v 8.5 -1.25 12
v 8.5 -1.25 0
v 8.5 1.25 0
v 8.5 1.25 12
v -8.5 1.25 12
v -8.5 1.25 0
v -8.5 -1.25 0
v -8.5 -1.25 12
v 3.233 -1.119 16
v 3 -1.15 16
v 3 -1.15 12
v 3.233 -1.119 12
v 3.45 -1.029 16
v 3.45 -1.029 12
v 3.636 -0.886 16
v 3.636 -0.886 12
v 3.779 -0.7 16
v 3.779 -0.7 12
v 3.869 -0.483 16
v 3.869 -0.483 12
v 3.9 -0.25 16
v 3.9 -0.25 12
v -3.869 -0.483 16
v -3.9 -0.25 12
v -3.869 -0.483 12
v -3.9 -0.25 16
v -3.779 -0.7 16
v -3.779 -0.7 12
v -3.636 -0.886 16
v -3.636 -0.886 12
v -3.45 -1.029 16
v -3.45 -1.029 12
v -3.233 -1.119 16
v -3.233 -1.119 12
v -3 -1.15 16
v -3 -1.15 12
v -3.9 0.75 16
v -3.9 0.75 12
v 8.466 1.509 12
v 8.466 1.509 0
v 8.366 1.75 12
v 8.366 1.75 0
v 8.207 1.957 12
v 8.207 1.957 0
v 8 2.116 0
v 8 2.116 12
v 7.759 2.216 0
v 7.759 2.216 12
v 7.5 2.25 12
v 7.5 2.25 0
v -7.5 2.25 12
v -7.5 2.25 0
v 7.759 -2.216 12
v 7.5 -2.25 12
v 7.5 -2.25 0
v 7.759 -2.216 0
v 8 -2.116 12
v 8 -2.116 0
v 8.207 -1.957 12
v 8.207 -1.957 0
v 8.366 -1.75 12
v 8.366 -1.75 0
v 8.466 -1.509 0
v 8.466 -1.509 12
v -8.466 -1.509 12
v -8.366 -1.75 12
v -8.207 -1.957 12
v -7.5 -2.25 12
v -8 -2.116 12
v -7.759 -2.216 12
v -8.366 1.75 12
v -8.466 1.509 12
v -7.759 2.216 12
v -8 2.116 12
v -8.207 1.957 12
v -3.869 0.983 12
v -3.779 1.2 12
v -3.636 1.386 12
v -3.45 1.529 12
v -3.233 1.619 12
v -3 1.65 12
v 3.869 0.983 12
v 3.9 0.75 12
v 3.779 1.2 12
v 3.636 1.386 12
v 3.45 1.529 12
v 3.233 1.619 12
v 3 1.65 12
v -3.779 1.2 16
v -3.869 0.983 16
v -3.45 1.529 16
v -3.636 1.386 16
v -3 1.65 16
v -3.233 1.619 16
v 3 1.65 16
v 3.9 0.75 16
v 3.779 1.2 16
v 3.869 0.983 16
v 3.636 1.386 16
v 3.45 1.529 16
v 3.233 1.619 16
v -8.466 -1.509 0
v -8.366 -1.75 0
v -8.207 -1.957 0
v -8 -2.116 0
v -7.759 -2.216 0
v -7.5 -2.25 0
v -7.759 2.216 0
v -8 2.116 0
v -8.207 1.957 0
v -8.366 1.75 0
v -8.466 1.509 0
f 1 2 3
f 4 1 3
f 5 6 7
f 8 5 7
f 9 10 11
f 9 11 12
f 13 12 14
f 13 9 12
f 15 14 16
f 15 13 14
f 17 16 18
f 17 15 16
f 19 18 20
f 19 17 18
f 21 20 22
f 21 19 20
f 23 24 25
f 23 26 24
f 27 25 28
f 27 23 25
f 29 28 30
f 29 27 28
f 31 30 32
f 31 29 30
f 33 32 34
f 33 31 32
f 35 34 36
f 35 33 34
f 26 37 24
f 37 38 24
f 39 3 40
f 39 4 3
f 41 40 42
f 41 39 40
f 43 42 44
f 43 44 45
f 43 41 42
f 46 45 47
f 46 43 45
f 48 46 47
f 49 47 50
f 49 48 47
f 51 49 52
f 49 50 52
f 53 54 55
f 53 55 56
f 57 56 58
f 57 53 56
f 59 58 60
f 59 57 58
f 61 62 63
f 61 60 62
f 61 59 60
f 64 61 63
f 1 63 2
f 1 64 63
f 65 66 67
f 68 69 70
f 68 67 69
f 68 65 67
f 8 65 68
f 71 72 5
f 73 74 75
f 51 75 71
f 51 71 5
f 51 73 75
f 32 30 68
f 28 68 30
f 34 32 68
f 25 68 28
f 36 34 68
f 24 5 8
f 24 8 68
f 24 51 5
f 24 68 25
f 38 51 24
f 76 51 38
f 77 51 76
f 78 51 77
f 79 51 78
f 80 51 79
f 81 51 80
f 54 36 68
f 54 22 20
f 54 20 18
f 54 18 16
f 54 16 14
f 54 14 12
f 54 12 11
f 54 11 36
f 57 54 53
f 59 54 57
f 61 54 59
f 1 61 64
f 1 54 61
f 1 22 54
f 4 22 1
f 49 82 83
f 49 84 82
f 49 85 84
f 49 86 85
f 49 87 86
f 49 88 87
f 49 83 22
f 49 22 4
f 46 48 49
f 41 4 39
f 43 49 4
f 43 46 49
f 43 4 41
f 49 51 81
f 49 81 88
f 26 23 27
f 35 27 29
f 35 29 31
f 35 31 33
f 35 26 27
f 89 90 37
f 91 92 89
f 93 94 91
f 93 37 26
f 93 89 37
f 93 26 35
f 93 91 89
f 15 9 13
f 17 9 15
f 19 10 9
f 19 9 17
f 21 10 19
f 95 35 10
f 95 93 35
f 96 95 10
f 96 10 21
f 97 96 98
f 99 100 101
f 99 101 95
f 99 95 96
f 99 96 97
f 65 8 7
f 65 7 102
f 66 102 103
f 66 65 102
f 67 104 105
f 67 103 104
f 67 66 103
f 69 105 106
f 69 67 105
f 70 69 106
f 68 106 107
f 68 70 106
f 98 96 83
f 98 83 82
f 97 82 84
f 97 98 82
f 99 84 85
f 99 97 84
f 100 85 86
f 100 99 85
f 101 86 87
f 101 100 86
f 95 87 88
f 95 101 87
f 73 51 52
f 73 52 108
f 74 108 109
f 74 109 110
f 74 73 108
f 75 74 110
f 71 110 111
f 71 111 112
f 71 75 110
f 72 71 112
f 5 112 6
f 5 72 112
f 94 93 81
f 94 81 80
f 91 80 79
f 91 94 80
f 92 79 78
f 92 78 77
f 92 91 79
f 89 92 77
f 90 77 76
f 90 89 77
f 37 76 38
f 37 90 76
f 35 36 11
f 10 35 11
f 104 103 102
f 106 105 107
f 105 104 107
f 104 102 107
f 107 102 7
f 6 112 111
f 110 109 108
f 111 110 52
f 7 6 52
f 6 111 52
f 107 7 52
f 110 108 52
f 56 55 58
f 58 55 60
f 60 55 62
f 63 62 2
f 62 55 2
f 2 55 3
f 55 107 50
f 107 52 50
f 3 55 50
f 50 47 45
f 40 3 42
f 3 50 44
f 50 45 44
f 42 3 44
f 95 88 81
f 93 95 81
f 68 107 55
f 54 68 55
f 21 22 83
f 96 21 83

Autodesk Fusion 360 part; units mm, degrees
sketch "Sketch1" plane through (0, 0, 0) normal (0, 0, 1) x (1, 0, 0)
  line L0 (8.5, 2.25) -> (-8.5, 2.25)
  line L1 (-8.5, 2.25) -> (-8.5, -2.25)
  line L2 (-8.5, -2.25) -> (8.5, -2.25)
  line L3 (8.5, -2.25) -> (8.5, 2.25)
  line L4 (8.5, 2.25) -> (-8.5, -2.25) construction
  line L5 (-8.5, 2.25) -> (8.5, -2.25) construction
  dimension "d1" = 17
  dimension "d2" = 4.5
extrude "Extrude1" add sketch "Sketch1" along normal blind 12
sketch "Sketch2" plane through (0, 0, 12) normal (0, 0, 1) x (1, 0, 0)
  line L0 (8.5, -2.25) -> (8.5, 2.25)
  line L1 (8.5, 2.25) -> (-8.5, 2.25)
  line L2 (-8.5, 2.25) -> (-8.5, -2.25)
  line L3 (-8.5, -2.25) -> (8.5, -2.25)
  line L4 (3.9, 1.65) -> (-3.9, 1.65)
  line L5 (-3.9, 1.65) -> (-3.9, -1.15)
  line L6 (-3.9, -1.15) -> (3.9, -1.15)
  line L7 (3.9, -1.15) -> (3.9, 1.65)
  line L8 (3.9, 1.65) -> (-3.9, -1.15) construction
  line L9 (-3.9, 1.65) -> (3.9, -1.15) construction
  point P0 (0, 0.25)
  dimension "d5" = 7.8
  dimension "d6" = 2.8
  dimension "d7" = 0.6
extrude "Extrude2" add sketch "Sketch2" along normal blind 4 contours L4 L5 L6 L7
fillet "Fillet1" radius 1 4 edges at (-8.5, 2.25, 6) (-8.5, -2.25, 6) (8.5, -2.25, 6) (8.5, 2.25, 6)
fillet "Fillet2" radius 0.9 4 edges at (3.9, 1.65, 14) (-3.9, 1.65, 14) (3.9, -1.15, 14) (-3.9, -1.15, 14)
